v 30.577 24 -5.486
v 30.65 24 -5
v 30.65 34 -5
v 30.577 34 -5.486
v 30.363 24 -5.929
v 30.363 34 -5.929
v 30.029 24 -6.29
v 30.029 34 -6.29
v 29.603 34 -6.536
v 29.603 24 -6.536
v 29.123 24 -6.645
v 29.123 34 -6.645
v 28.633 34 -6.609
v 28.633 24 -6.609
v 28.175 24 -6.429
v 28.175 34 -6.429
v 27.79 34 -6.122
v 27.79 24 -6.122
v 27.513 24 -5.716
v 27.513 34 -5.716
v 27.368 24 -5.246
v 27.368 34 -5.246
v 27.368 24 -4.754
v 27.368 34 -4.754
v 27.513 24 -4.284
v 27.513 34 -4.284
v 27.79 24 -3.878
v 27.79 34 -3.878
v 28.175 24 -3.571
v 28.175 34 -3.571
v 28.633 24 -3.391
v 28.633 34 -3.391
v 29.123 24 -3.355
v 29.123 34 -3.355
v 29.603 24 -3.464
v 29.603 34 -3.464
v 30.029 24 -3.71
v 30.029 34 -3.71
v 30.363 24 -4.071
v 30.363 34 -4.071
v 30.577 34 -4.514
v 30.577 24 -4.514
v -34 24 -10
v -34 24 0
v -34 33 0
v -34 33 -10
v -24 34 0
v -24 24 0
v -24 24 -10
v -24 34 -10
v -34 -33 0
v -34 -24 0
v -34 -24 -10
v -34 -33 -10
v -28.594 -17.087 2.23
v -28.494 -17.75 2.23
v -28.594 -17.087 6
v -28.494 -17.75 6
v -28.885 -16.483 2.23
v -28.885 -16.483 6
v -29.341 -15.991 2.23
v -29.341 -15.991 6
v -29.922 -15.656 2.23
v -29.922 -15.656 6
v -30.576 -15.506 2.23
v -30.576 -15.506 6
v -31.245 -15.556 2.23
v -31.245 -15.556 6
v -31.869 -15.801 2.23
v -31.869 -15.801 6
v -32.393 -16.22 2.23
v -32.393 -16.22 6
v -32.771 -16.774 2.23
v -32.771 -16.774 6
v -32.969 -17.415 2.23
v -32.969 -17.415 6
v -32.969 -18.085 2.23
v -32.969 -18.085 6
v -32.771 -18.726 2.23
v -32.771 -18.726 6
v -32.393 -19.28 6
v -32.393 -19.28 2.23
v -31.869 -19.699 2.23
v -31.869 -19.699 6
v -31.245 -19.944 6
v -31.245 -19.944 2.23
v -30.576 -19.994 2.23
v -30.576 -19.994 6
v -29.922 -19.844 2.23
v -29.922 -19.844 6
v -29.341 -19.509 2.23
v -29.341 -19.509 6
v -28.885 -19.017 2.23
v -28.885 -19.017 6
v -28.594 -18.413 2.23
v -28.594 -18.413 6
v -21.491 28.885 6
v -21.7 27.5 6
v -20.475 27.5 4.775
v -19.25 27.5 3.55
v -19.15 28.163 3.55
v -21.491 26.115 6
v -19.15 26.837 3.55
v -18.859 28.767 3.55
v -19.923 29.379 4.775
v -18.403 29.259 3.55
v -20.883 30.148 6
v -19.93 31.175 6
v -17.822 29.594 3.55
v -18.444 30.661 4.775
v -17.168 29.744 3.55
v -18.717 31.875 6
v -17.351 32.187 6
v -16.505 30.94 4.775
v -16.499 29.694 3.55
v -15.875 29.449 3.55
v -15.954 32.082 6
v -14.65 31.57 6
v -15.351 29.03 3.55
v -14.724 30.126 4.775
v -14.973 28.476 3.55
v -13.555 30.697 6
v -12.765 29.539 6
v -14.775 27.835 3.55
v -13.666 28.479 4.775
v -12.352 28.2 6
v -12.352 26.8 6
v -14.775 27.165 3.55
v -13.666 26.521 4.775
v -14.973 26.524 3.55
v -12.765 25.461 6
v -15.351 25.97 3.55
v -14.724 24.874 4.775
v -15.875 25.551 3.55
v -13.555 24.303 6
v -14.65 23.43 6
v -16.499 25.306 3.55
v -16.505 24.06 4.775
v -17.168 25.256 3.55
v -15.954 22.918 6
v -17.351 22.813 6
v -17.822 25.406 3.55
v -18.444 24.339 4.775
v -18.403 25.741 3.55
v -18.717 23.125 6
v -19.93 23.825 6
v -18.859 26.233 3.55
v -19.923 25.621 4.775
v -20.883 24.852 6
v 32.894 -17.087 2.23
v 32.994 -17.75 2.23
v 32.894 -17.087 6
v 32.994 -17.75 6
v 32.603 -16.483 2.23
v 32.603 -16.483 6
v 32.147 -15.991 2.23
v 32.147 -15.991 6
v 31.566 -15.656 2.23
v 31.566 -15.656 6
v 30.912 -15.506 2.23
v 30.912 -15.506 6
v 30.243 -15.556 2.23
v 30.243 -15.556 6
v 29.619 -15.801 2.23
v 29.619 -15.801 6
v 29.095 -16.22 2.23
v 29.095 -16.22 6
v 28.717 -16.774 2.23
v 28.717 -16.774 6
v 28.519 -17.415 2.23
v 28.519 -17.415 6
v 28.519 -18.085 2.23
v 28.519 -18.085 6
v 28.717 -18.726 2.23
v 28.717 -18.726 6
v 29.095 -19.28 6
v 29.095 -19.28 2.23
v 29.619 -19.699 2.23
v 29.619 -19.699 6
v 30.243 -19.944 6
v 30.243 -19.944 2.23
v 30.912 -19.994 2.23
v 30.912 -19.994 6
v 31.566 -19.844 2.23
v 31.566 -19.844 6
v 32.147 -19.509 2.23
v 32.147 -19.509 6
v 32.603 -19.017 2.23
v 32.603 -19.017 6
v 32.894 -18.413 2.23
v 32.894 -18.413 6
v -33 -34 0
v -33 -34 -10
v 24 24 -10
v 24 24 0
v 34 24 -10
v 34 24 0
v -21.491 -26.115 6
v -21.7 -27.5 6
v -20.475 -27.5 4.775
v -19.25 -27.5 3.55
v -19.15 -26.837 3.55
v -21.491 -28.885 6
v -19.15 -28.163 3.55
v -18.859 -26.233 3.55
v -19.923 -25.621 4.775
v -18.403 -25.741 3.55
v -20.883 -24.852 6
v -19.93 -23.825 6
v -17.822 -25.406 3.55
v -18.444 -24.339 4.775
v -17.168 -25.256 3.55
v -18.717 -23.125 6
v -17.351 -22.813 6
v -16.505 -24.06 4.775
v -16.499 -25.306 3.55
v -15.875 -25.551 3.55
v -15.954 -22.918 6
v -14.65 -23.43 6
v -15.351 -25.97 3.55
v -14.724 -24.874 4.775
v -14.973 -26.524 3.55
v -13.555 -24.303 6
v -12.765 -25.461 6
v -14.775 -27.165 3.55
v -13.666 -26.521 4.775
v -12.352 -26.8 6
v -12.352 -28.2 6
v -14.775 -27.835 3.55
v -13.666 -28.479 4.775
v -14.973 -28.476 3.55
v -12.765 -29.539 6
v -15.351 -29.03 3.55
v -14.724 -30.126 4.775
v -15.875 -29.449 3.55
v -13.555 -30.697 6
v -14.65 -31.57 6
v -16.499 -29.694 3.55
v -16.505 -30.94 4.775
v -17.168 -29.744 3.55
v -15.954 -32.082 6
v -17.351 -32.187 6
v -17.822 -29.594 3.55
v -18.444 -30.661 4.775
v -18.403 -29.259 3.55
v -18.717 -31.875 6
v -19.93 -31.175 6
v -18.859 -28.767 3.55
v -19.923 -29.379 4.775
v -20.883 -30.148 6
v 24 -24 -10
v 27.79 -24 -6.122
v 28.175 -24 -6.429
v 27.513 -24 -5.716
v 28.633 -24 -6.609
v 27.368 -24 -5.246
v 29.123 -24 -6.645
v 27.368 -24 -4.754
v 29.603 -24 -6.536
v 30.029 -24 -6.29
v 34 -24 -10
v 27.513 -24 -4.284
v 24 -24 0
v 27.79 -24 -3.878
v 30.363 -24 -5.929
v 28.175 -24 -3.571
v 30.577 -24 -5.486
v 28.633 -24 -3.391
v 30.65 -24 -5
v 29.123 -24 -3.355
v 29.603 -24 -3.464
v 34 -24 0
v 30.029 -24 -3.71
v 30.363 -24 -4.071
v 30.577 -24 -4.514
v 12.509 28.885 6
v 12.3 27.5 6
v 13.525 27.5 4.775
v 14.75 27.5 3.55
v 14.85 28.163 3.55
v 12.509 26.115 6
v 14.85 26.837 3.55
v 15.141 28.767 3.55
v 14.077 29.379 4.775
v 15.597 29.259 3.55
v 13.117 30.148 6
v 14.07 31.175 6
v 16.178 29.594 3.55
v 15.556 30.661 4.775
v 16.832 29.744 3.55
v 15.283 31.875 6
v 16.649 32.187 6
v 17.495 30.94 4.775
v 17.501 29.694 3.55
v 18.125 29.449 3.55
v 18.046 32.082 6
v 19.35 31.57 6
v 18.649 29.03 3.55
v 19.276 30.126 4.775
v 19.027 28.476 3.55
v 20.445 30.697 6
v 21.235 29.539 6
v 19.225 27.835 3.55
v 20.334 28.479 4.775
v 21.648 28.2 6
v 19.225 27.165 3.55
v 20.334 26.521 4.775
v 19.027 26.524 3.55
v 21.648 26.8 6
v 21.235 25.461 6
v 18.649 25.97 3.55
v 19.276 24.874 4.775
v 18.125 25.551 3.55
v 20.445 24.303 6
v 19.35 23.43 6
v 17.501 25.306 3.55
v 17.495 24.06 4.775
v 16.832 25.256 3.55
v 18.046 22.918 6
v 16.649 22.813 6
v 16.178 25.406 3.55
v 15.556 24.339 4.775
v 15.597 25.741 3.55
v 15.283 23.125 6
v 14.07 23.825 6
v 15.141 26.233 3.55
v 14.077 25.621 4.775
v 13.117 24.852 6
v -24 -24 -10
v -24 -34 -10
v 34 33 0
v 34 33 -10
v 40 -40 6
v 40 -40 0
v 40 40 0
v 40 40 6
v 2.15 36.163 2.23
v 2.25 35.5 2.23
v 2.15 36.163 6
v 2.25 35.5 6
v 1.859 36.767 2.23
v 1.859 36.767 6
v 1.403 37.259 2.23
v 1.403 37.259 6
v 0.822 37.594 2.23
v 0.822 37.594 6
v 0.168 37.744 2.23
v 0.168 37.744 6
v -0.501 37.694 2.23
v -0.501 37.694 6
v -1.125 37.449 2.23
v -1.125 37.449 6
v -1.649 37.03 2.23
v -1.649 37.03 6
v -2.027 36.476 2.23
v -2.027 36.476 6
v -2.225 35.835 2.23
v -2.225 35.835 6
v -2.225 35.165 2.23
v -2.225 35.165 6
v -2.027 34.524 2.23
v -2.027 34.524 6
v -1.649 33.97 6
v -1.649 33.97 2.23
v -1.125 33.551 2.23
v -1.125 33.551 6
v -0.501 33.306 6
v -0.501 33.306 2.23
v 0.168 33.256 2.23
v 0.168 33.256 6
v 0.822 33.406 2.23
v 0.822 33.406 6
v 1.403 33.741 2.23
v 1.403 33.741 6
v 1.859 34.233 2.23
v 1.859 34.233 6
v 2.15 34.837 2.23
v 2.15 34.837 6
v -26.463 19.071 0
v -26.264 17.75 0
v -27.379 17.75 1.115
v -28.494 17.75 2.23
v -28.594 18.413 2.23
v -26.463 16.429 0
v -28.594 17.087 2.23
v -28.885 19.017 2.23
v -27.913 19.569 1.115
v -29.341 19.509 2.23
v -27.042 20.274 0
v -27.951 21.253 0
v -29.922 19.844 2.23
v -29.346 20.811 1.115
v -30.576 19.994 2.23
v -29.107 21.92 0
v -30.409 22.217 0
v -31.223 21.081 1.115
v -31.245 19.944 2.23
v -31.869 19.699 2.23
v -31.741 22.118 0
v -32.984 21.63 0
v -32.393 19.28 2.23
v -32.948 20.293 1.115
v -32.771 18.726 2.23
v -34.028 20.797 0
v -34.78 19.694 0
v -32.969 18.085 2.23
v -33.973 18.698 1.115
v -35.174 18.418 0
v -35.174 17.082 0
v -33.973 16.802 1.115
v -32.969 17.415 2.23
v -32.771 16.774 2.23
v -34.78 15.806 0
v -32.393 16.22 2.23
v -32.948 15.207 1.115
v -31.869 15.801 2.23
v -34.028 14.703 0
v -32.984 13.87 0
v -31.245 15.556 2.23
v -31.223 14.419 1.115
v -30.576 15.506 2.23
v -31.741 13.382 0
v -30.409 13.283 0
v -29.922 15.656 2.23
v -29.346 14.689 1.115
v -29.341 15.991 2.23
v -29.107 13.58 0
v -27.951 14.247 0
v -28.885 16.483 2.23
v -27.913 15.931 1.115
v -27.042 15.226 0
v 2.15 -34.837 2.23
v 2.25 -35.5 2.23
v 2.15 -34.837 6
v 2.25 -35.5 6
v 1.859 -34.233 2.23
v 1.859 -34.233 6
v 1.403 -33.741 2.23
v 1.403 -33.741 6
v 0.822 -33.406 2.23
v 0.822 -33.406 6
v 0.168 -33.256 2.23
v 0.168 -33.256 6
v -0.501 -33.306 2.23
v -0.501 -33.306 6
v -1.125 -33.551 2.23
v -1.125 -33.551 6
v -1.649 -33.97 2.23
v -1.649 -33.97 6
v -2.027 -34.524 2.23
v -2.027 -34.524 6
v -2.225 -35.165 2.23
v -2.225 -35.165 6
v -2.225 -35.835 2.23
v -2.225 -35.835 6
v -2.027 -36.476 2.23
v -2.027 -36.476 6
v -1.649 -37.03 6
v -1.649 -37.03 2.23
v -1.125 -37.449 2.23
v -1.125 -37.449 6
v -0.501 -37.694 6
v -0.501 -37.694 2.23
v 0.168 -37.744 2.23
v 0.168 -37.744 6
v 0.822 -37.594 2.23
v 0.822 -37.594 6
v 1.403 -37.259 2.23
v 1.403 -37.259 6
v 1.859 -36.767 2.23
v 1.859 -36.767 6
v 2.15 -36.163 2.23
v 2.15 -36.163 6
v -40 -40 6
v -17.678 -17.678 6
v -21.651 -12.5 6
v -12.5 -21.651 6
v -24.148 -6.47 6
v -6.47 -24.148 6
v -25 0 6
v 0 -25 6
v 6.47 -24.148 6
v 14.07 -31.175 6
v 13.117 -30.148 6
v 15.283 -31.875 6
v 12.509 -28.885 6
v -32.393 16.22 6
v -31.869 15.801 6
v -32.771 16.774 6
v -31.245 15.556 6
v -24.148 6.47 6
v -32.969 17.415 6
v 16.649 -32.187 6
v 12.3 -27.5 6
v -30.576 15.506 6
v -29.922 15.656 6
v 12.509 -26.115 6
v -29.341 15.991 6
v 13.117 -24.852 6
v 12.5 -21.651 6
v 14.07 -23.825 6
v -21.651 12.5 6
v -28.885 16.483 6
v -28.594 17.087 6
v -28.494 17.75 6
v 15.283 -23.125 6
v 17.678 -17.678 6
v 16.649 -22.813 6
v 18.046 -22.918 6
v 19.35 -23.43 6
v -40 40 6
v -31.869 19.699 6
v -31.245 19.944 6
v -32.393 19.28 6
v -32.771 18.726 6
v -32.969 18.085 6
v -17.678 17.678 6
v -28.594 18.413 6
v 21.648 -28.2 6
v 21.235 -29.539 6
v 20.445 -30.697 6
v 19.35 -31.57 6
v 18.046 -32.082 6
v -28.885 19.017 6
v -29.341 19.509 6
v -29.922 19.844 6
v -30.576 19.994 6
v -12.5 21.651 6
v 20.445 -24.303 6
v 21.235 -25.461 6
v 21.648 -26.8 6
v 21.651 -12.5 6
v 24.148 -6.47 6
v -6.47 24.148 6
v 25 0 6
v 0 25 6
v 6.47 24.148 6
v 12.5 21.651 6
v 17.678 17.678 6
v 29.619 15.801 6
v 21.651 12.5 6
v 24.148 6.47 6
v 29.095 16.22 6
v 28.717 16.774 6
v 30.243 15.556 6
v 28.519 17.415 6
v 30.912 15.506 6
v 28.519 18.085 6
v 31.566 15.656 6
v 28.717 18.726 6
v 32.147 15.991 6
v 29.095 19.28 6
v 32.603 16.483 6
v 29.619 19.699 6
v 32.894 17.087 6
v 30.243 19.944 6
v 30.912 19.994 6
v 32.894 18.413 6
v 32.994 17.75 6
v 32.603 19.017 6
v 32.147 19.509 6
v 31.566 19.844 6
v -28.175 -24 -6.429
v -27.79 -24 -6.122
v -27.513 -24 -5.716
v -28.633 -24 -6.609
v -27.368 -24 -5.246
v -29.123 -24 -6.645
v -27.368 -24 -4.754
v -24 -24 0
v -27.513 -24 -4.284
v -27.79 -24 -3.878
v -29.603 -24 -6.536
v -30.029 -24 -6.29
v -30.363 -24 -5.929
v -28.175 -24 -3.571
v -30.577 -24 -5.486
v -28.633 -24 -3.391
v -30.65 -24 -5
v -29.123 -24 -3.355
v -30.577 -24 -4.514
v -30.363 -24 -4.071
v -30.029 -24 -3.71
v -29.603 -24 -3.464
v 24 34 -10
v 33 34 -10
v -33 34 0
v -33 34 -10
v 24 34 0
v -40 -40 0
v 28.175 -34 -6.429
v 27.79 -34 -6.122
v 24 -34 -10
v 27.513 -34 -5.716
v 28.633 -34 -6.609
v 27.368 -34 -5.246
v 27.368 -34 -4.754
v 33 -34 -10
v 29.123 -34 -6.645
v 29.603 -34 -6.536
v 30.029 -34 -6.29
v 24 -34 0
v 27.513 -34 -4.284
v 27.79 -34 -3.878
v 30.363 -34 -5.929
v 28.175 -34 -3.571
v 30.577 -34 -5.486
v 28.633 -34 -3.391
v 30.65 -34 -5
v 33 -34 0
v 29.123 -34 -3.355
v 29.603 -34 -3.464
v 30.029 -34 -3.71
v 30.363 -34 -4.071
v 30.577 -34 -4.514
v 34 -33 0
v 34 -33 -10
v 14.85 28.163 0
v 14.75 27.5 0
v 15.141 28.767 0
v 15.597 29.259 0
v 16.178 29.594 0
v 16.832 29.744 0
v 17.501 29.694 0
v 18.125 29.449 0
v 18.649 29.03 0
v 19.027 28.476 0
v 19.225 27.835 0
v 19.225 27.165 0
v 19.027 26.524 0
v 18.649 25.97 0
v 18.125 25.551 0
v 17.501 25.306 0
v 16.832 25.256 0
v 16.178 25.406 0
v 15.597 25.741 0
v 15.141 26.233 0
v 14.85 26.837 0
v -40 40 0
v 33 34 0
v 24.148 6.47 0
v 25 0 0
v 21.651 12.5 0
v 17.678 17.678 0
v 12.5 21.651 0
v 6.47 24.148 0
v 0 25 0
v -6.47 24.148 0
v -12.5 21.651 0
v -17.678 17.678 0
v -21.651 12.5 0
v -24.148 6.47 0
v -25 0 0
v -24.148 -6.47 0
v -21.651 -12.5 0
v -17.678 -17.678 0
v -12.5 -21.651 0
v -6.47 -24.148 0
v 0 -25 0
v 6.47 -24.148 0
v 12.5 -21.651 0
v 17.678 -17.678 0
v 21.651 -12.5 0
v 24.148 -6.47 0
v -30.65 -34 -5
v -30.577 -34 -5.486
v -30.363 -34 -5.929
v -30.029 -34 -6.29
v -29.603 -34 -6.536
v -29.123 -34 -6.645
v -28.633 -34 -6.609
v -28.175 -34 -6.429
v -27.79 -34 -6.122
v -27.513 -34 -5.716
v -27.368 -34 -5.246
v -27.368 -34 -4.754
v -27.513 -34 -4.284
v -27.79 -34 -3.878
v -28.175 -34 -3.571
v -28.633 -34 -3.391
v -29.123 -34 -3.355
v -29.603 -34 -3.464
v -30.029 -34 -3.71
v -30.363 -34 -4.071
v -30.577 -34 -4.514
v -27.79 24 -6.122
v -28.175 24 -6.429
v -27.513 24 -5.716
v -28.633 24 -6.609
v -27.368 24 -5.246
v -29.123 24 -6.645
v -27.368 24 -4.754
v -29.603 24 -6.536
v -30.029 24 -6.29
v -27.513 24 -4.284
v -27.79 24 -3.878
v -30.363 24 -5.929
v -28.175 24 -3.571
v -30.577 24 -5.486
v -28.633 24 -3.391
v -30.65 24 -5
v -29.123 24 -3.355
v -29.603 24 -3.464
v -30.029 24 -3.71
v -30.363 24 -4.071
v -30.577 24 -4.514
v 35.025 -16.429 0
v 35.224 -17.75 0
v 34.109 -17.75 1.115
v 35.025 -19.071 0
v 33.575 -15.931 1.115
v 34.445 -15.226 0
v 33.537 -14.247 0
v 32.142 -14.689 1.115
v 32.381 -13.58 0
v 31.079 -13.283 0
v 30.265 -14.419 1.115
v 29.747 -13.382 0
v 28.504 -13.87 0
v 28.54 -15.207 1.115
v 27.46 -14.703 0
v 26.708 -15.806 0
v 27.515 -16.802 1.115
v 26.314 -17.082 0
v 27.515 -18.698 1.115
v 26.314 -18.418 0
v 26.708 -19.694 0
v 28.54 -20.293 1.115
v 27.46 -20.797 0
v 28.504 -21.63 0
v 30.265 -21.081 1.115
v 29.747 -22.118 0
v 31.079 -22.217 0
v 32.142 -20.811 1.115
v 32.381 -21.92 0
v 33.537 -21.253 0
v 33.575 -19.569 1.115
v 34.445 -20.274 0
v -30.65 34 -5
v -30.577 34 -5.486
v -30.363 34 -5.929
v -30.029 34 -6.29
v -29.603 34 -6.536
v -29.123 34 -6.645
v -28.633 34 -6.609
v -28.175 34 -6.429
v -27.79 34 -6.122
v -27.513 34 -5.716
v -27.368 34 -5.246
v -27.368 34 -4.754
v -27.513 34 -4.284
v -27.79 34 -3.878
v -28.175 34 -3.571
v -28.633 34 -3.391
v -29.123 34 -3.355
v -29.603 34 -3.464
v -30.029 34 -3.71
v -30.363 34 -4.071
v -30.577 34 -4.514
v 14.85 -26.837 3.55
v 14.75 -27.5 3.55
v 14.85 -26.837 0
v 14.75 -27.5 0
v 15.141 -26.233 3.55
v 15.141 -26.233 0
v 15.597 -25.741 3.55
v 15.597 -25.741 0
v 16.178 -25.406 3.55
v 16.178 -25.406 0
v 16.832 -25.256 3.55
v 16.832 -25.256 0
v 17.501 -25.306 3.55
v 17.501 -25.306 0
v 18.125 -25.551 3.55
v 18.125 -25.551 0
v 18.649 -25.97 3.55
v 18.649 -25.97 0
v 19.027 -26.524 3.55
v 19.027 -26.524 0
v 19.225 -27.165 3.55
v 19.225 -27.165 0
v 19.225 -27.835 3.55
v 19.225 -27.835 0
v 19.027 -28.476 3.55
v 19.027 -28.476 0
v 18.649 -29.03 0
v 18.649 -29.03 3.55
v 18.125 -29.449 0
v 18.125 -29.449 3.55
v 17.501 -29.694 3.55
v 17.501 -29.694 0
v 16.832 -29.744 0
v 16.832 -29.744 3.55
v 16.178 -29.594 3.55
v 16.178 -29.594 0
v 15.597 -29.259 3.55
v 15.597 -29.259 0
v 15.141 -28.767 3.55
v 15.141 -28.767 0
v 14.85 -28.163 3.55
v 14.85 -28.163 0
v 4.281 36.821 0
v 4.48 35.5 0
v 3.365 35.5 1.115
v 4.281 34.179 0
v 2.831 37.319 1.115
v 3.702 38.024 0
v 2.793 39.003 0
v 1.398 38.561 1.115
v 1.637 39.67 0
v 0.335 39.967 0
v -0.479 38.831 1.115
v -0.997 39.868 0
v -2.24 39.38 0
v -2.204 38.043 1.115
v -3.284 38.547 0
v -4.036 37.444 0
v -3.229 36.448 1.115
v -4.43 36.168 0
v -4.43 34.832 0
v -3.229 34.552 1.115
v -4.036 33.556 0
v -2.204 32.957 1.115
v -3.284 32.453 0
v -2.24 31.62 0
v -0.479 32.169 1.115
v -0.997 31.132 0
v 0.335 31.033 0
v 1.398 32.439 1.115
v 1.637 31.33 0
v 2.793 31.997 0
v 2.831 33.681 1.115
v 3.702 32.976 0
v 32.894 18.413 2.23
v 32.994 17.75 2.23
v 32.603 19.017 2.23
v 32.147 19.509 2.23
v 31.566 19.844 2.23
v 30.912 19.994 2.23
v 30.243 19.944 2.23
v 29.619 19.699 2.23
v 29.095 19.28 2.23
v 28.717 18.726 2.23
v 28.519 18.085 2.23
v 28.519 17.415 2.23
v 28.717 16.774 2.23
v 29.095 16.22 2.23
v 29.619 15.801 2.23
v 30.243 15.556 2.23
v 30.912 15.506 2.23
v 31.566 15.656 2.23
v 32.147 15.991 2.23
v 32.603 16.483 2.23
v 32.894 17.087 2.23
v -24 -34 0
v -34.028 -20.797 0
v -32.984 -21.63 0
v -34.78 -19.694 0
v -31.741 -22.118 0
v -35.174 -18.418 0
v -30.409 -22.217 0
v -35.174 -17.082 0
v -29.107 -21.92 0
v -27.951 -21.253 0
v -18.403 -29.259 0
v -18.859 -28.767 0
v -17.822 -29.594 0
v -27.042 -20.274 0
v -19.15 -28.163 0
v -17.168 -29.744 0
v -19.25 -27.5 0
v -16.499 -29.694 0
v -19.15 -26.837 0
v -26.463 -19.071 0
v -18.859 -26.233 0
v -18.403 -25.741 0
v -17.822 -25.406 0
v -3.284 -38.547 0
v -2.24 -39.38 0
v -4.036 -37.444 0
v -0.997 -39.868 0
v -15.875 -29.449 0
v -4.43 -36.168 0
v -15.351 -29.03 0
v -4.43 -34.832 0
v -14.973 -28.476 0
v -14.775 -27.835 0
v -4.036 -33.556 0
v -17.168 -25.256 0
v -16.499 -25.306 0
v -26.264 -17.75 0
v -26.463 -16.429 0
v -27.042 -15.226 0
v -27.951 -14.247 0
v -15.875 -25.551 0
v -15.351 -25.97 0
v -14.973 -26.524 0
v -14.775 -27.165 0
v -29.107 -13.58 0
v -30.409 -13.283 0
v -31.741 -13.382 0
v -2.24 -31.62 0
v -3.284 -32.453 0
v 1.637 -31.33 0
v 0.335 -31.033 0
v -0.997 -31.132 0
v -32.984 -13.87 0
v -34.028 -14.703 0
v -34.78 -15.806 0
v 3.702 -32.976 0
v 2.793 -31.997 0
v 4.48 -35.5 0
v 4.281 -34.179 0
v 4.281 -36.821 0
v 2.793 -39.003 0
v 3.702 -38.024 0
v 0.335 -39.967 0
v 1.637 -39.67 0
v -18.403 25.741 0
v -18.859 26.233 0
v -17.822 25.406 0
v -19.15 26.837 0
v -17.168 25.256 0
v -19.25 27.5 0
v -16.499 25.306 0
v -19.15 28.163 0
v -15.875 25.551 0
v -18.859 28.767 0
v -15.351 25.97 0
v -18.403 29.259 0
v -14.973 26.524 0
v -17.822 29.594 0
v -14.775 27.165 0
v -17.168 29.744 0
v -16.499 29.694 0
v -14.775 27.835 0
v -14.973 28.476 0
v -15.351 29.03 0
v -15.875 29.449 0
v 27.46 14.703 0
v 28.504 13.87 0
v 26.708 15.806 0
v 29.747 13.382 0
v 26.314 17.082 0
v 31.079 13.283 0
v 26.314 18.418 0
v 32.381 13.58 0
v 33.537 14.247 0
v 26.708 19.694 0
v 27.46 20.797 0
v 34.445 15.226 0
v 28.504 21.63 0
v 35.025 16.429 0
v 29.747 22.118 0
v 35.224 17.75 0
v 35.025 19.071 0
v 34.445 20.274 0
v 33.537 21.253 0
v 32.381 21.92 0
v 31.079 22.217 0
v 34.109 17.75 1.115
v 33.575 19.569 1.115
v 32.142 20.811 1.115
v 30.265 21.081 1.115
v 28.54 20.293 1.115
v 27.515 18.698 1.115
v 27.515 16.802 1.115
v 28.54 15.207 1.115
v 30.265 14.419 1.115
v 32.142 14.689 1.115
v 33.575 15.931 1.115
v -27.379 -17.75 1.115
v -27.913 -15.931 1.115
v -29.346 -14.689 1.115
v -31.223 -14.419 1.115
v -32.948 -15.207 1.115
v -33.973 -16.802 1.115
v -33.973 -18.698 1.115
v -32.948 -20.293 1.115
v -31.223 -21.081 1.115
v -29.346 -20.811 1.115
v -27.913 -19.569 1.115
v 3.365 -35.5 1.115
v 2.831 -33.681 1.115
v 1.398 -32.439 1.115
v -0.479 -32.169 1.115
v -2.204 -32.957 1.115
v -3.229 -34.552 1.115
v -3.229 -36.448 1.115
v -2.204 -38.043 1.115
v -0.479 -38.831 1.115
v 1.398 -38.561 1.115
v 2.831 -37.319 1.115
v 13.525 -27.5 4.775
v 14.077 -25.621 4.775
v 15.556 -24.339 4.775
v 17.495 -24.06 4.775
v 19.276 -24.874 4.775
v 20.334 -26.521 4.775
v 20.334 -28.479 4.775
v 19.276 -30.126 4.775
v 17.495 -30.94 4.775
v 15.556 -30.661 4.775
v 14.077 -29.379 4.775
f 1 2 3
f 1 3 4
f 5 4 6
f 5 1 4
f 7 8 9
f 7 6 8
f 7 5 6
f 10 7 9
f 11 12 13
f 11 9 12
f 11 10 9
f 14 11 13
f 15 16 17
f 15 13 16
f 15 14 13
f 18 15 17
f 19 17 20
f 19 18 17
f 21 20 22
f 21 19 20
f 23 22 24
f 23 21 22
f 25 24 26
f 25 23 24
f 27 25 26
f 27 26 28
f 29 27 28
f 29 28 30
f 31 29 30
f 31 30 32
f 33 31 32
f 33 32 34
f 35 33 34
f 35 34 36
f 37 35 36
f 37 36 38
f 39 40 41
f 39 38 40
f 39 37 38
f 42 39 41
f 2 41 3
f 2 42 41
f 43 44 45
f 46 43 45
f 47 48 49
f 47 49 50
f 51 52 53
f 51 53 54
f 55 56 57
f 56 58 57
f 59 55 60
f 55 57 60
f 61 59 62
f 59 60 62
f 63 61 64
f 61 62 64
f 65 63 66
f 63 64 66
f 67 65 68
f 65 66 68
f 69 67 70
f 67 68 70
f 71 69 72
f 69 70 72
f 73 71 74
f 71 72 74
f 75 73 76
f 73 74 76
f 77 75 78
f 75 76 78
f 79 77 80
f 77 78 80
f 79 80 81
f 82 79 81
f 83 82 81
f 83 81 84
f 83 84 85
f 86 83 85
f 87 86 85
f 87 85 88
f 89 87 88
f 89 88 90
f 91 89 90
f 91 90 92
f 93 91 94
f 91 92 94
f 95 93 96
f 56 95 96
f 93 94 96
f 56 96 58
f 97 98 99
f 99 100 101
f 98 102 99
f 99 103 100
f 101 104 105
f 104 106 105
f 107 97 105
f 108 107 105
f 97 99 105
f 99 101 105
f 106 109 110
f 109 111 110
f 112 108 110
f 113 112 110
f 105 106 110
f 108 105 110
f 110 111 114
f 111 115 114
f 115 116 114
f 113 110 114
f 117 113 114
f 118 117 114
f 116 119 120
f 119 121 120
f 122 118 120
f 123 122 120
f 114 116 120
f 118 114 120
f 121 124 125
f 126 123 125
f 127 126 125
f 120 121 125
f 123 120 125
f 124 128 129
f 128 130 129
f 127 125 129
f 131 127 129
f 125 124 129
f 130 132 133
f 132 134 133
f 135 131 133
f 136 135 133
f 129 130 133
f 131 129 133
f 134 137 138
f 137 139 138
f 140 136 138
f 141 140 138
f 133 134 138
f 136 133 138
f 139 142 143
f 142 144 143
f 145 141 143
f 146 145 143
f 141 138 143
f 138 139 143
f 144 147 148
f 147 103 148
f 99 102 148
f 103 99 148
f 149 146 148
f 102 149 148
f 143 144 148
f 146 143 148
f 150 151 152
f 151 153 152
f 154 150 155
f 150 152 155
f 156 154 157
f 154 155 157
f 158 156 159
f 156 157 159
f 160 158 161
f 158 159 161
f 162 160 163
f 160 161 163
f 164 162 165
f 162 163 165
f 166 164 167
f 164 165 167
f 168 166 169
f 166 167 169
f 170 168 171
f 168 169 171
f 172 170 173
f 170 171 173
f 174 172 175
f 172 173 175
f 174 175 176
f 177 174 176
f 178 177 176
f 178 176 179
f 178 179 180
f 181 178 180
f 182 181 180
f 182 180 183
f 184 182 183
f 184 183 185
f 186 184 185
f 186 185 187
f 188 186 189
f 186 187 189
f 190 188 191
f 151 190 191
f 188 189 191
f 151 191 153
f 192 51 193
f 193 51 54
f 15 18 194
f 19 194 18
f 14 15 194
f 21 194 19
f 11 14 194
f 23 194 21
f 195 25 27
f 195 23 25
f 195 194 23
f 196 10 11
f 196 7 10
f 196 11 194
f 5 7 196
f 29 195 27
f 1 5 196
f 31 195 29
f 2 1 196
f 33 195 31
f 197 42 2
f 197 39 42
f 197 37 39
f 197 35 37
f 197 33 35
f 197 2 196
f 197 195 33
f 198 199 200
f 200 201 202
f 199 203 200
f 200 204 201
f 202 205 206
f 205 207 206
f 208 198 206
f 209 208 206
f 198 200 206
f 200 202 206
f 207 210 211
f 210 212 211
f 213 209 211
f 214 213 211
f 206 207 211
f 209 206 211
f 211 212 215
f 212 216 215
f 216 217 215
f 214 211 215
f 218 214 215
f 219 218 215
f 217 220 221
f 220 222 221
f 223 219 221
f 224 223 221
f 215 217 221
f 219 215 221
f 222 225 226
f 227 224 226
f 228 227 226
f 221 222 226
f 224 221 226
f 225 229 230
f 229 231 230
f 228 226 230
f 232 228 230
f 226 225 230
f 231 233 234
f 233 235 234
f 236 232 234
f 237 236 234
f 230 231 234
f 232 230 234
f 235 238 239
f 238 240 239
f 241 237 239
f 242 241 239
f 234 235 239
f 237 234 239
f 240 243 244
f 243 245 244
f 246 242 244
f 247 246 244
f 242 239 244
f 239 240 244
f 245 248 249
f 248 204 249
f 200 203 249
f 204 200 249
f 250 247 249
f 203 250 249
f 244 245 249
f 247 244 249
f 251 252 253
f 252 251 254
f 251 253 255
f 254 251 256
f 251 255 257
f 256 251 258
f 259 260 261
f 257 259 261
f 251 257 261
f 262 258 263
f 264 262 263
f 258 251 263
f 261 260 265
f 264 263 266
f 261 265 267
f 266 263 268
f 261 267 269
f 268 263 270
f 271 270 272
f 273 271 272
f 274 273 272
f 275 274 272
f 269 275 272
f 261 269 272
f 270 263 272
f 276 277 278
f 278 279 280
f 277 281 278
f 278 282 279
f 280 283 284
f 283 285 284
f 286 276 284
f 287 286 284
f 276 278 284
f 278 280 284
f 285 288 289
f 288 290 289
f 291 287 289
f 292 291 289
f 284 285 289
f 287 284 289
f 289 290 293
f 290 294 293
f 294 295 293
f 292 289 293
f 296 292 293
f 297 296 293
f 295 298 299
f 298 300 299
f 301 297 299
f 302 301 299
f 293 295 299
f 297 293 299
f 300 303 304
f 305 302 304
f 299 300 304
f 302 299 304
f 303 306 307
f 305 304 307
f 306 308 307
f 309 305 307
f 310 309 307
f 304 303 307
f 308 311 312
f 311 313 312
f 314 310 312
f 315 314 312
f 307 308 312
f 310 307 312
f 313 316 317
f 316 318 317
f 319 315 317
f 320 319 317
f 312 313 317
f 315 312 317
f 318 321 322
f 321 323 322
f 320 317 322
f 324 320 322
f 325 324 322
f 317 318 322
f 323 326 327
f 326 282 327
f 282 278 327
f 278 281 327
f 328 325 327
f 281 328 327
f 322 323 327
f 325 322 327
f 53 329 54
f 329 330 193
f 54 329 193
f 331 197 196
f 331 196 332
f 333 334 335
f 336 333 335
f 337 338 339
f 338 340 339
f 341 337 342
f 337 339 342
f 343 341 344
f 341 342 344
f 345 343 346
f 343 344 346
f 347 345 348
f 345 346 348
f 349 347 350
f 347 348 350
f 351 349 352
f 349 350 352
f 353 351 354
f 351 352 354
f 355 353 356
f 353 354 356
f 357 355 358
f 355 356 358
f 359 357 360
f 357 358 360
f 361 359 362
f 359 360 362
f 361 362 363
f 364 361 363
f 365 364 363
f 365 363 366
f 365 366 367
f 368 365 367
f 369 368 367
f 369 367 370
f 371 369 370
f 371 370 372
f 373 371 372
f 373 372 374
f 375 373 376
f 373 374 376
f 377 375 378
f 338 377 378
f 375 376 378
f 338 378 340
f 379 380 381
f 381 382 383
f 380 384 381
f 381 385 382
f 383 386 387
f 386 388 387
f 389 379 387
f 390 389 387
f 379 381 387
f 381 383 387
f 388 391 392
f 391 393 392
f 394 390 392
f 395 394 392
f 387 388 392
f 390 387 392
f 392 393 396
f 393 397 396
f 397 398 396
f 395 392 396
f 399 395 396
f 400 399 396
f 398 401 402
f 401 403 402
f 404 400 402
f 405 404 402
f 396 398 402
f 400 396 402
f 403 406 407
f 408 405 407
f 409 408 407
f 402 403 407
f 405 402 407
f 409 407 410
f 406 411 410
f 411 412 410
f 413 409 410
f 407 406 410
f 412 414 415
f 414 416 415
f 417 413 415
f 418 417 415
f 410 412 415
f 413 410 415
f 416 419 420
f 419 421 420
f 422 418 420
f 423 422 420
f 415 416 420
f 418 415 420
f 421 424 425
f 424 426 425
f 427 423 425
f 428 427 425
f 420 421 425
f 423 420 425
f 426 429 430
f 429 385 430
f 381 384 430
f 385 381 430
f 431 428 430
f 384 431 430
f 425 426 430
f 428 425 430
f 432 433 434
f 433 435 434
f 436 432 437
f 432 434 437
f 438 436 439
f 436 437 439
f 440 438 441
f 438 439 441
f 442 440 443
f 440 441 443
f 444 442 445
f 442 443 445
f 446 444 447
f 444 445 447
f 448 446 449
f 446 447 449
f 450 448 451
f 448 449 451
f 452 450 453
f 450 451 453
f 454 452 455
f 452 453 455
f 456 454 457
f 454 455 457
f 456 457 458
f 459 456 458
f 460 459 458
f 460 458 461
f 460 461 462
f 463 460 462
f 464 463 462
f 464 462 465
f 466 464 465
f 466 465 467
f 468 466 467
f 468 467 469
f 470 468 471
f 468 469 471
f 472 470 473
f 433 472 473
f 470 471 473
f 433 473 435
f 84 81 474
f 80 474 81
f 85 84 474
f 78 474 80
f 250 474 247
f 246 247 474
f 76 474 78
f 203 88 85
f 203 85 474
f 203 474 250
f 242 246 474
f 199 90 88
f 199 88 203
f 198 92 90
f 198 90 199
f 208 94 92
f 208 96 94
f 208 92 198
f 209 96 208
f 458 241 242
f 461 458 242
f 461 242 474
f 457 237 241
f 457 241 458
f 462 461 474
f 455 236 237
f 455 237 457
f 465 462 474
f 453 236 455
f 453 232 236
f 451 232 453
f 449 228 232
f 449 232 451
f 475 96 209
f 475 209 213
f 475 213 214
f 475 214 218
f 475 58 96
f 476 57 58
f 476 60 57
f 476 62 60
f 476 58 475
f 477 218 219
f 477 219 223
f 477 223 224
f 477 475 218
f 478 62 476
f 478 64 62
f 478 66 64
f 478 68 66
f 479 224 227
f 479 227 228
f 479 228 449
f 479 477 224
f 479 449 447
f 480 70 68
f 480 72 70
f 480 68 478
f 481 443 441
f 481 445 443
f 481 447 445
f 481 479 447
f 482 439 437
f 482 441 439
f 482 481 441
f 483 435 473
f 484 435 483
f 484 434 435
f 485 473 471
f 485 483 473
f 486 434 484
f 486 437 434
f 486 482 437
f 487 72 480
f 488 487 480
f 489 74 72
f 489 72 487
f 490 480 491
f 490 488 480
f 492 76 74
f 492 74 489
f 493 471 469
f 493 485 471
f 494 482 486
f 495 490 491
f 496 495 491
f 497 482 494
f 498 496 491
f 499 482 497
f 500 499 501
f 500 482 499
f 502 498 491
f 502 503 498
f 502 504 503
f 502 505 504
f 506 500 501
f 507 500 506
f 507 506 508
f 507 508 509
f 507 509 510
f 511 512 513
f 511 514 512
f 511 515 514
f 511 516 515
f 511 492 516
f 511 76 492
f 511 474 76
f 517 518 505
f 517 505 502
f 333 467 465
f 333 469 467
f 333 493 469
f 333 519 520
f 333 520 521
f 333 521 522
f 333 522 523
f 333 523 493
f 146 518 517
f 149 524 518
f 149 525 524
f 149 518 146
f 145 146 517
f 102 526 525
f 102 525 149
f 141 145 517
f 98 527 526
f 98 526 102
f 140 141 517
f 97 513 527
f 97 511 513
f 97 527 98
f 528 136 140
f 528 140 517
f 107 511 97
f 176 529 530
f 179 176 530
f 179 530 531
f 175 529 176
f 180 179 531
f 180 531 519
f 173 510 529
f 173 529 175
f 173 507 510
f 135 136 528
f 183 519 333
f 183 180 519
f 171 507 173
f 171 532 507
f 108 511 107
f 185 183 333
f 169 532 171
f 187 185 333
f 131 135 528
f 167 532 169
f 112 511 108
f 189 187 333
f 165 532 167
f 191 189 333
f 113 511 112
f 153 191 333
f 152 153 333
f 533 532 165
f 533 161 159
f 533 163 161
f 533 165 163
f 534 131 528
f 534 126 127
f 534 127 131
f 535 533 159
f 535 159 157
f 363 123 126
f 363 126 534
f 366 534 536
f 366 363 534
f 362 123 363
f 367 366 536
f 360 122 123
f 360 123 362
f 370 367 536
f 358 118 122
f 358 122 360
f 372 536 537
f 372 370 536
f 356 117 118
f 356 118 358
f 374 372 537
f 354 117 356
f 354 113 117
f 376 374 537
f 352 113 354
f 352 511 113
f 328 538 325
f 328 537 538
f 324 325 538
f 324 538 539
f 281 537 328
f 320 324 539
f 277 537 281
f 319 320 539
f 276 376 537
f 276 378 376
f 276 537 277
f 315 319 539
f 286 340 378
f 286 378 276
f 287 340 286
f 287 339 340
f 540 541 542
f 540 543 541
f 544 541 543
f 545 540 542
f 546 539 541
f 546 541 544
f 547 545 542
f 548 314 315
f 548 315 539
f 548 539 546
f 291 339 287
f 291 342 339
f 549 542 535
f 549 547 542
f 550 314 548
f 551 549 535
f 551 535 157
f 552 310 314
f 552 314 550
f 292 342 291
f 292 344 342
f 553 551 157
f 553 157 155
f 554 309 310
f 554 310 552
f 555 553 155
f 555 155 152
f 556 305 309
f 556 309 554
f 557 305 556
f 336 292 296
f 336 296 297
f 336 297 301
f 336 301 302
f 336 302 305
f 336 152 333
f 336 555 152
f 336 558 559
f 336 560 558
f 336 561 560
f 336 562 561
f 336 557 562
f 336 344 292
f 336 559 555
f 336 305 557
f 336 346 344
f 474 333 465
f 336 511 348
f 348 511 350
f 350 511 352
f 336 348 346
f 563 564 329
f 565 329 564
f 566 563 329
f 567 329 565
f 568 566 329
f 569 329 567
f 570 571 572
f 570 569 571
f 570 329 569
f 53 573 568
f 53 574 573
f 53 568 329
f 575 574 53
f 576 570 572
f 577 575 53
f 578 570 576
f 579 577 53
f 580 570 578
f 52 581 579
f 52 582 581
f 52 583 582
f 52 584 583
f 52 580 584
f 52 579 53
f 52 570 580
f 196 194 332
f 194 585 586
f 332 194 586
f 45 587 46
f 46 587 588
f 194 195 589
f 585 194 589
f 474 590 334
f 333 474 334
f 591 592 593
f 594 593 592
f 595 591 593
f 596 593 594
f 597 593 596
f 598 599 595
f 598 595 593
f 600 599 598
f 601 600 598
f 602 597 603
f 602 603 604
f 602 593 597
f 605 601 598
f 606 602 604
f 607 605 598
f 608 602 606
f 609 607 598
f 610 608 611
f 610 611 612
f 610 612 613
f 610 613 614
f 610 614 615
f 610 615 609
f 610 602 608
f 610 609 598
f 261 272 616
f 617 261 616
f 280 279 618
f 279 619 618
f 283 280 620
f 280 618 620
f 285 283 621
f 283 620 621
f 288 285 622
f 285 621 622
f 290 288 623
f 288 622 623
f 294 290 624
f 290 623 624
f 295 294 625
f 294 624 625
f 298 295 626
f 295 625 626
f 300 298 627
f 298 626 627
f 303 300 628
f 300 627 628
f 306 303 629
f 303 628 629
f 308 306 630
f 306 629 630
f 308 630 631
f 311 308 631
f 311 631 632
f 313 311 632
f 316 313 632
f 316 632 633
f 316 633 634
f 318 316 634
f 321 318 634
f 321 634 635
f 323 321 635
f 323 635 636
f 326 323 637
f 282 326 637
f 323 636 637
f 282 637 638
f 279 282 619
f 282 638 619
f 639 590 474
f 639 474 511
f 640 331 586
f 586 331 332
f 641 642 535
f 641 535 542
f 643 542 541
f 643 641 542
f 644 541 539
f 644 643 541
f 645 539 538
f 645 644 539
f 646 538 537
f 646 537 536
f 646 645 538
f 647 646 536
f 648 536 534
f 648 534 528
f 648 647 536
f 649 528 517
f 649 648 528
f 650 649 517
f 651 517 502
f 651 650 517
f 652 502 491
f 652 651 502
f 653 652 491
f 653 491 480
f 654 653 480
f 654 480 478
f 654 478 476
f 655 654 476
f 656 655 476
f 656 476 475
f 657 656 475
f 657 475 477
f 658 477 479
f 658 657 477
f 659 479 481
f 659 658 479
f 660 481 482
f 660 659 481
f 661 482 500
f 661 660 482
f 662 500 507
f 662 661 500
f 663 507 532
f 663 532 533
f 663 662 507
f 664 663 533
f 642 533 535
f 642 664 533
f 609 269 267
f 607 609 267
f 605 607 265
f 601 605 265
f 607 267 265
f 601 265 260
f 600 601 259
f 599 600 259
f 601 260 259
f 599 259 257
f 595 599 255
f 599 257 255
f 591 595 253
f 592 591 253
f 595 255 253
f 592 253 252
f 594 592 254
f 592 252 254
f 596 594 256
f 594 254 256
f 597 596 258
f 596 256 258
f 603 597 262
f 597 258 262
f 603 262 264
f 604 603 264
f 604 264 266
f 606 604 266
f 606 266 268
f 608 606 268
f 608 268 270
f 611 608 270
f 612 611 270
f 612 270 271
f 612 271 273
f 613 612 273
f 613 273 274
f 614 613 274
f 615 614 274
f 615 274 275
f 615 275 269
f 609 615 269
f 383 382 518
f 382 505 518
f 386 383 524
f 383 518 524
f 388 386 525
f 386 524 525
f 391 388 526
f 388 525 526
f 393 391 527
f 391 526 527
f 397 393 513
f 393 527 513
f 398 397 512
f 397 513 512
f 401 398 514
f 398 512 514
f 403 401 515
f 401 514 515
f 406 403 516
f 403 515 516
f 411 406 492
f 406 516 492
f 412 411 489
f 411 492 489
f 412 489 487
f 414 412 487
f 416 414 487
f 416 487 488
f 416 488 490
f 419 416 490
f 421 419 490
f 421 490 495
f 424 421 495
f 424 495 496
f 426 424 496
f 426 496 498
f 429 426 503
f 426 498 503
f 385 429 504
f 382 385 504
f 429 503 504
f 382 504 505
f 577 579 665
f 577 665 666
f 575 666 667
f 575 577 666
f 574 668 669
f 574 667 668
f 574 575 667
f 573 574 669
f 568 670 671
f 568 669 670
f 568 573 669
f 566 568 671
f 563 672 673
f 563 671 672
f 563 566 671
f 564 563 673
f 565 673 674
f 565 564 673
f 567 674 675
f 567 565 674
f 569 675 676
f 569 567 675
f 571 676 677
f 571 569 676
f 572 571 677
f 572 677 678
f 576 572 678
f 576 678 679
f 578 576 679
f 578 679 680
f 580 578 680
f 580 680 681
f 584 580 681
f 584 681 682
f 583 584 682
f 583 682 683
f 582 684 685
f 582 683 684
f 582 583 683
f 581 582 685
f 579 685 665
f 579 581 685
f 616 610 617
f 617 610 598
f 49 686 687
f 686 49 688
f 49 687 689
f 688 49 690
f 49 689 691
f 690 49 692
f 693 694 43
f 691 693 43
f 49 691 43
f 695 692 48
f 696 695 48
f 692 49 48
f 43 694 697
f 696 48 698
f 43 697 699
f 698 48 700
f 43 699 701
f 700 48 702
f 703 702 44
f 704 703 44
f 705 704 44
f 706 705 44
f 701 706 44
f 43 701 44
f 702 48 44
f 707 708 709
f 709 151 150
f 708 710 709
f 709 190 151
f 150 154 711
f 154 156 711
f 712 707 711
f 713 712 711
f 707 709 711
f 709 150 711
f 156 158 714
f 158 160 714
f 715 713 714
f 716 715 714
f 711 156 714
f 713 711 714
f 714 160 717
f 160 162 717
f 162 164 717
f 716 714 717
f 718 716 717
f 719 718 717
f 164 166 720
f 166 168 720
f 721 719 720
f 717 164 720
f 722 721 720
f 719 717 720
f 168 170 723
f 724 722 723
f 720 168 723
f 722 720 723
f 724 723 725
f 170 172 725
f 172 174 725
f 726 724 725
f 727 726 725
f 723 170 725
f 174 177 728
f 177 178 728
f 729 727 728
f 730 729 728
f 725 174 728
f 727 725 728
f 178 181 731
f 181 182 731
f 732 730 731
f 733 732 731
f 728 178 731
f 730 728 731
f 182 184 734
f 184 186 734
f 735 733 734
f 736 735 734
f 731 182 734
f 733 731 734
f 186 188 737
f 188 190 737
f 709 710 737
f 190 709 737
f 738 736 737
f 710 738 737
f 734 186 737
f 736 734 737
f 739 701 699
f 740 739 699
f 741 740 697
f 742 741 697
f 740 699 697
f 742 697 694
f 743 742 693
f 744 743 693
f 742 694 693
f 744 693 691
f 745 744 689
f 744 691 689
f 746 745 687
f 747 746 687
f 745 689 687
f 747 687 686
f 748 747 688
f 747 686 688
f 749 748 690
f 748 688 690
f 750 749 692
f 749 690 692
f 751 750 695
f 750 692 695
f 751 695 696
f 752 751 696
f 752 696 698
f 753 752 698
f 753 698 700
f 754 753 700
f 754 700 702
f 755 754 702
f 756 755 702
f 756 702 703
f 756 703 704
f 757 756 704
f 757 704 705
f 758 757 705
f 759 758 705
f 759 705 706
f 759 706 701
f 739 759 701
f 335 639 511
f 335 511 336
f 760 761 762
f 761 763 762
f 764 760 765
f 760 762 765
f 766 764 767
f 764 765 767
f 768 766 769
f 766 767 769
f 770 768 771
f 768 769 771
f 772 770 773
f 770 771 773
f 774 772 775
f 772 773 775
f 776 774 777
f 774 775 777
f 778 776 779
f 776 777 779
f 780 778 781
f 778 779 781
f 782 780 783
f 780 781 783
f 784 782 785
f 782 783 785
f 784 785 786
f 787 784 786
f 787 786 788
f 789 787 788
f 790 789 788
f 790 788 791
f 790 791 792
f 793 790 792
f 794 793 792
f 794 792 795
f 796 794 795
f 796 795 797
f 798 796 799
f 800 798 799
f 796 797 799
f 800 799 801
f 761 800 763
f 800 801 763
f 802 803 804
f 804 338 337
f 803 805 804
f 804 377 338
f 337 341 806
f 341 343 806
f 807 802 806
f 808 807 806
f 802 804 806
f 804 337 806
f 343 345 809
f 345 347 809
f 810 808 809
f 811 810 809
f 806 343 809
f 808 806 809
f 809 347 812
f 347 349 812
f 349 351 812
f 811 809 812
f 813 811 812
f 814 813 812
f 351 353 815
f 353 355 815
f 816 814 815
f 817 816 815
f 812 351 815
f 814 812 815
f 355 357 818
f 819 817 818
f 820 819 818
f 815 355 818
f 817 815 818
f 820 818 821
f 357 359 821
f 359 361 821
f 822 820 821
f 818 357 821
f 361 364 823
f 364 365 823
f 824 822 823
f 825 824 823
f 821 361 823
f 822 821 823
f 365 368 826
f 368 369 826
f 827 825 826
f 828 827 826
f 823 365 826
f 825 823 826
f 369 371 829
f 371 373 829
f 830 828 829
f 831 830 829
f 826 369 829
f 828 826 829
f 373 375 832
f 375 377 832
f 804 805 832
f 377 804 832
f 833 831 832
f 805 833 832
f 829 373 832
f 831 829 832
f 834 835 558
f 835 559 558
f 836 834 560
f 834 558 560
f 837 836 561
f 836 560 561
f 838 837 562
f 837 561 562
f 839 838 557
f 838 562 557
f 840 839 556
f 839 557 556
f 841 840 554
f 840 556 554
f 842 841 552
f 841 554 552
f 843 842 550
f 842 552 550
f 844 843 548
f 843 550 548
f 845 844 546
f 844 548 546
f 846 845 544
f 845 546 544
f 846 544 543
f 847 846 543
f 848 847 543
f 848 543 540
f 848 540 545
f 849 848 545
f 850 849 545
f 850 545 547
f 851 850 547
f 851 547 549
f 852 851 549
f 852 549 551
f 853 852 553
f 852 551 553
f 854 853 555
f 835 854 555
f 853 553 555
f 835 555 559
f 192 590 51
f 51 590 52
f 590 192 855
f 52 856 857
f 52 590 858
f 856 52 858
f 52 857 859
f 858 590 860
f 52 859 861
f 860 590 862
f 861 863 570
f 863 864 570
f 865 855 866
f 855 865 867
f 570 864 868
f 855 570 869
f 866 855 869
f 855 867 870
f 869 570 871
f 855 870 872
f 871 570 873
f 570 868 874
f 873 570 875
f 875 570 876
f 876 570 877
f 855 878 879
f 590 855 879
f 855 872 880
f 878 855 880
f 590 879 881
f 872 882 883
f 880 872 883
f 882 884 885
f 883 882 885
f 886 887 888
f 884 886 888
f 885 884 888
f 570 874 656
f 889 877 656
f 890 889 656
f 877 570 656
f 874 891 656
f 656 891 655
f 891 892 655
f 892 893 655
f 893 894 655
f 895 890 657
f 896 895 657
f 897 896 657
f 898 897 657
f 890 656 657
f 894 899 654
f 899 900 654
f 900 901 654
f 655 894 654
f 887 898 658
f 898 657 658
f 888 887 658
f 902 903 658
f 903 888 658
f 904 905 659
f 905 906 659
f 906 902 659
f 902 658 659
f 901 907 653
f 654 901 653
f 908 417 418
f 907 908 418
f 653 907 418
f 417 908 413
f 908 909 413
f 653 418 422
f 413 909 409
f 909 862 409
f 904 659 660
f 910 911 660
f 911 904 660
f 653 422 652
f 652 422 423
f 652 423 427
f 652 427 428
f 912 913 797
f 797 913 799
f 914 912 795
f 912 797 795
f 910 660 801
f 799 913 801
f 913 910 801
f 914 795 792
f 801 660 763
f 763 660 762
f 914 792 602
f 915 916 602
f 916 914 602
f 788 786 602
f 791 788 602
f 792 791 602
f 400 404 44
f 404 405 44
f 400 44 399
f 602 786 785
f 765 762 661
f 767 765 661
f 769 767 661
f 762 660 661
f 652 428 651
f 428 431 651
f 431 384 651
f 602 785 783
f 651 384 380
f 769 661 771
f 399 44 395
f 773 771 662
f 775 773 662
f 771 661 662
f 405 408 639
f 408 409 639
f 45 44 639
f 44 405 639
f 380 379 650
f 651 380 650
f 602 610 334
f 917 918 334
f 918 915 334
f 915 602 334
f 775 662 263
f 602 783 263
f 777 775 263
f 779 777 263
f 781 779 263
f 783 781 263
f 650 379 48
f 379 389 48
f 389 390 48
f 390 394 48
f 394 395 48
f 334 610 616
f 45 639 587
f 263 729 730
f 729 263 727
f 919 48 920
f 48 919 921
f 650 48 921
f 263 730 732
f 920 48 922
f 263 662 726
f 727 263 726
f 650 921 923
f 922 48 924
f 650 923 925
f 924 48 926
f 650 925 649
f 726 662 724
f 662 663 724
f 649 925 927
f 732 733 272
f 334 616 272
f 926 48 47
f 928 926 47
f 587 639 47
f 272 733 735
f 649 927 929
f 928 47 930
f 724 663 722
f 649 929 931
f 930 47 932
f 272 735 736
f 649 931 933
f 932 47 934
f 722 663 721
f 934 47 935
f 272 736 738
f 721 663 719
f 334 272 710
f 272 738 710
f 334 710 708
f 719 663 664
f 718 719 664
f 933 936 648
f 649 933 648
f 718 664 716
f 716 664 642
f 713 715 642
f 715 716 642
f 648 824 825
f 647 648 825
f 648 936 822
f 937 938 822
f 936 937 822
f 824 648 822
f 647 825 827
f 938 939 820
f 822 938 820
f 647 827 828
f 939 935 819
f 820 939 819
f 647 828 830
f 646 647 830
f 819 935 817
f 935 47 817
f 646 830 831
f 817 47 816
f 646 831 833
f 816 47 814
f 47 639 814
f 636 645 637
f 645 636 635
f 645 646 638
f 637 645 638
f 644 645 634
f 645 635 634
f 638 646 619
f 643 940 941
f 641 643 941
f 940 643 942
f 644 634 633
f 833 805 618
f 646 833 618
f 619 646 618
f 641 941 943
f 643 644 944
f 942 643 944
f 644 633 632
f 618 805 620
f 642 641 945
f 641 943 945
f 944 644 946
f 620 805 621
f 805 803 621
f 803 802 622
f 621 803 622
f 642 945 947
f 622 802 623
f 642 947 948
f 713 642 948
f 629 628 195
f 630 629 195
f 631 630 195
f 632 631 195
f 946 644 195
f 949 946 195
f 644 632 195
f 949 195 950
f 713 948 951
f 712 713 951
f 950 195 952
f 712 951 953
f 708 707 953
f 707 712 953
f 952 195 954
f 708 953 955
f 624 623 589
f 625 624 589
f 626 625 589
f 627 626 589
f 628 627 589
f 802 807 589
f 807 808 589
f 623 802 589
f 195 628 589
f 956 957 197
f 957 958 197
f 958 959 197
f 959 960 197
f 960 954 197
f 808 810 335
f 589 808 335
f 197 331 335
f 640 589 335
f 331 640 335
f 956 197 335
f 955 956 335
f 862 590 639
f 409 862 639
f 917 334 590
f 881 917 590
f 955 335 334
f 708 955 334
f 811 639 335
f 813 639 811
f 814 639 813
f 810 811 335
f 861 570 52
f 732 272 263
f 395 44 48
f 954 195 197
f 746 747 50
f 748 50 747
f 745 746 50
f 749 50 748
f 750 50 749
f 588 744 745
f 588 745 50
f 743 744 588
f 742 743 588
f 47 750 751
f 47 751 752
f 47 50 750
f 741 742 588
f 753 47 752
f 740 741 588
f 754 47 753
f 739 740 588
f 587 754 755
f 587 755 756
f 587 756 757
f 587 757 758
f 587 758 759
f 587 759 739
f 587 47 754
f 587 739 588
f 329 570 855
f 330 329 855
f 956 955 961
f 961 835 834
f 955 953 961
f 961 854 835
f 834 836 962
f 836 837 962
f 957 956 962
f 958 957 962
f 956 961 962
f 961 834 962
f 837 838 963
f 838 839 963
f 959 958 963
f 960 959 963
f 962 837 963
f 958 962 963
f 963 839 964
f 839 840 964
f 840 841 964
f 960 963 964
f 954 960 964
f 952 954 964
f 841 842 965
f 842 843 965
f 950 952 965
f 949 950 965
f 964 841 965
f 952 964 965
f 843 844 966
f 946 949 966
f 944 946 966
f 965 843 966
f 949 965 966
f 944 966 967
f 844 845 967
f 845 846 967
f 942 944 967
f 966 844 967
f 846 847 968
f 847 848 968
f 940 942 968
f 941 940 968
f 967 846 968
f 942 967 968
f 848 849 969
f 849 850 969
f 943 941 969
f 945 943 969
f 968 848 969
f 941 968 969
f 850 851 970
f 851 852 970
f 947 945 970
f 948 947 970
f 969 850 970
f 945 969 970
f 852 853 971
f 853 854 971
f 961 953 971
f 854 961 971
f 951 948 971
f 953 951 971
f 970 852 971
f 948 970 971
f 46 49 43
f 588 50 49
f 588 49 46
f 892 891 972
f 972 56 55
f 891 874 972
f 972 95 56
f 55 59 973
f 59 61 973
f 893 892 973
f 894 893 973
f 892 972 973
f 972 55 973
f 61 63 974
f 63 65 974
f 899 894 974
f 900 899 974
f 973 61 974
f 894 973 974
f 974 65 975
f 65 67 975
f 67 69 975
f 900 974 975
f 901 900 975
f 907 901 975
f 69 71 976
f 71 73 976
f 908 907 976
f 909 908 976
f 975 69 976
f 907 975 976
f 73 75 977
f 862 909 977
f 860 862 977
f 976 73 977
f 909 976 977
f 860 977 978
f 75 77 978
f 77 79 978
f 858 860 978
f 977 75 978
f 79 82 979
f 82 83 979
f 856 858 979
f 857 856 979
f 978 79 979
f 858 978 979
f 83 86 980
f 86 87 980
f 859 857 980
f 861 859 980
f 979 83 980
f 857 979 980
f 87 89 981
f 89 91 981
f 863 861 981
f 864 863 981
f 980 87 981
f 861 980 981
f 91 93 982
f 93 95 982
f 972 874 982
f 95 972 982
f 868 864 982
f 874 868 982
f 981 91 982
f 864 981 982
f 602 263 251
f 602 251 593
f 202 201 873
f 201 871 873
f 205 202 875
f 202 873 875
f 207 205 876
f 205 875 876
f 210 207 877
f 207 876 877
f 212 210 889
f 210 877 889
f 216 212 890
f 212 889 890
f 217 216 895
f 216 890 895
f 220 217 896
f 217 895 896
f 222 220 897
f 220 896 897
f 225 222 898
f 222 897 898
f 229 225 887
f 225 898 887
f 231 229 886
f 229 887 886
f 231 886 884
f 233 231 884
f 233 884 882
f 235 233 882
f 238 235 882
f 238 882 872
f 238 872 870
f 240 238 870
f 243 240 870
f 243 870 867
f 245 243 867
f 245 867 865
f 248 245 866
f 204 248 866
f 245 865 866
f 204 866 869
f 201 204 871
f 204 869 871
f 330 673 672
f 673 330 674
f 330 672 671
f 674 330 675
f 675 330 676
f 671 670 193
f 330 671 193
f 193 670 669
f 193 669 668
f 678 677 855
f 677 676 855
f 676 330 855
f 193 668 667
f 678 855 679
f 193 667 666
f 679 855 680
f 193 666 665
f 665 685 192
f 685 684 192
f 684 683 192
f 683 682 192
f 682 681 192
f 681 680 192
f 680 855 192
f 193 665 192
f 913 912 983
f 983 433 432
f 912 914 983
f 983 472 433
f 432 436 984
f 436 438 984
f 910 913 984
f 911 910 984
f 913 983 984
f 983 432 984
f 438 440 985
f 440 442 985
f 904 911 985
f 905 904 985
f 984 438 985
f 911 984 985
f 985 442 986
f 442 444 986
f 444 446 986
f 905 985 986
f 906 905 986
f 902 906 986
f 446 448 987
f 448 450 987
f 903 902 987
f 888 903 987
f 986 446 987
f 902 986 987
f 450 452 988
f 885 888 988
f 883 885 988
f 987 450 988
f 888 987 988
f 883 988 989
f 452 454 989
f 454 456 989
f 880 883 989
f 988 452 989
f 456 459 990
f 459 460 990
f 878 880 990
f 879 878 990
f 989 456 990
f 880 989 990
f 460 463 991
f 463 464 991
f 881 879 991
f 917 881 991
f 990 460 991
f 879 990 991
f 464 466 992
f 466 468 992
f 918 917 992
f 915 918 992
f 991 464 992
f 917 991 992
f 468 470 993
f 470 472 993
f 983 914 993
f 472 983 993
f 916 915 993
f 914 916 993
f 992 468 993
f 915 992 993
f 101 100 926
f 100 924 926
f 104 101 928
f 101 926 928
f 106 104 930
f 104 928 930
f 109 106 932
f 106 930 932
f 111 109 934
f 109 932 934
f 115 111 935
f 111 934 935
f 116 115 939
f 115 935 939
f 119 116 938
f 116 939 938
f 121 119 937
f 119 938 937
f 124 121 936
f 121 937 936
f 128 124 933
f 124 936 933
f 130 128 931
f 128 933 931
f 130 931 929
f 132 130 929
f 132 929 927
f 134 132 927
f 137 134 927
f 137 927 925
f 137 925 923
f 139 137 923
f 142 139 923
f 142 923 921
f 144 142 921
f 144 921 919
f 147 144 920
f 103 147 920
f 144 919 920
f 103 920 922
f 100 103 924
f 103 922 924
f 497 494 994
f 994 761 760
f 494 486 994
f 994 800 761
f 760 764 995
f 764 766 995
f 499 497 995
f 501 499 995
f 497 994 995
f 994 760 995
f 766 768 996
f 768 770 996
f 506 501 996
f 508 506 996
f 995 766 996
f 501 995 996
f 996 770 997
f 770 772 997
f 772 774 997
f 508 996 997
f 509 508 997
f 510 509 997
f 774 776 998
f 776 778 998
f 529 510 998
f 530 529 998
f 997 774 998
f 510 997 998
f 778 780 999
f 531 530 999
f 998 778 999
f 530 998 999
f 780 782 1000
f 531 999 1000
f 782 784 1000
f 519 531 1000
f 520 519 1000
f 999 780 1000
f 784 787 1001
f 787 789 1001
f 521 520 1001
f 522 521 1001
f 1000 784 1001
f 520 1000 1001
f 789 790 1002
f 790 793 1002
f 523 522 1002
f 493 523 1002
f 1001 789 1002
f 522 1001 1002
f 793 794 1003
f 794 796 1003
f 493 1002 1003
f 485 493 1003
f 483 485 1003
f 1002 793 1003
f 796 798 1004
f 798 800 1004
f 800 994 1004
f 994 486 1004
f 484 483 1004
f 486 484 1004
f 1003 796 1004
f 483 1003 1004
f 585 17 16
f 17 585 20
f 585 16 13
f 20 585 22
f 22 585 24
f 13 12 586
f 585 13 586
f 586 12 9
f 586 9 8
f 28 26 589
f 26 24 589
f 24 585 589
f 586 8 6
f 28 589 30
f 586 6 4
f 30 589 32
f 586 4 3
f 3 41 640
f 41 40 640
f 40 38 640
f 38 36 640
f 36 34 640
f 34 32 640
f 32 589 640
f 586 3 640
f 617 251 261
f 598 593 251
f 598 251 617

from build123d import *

# Parameters (mm, degrees)
SKETCH_1_W                     = 80
SKETCH_1_H                     = 80
SKETCH_1_R                     = 25
EXTRUDE_1_DEPTH                = 6
SKETCH_11_W                    = 10
SKETCH_11_H                    = 10
EXTRUDE_3_DEPTH                = 10
HOLE_WIZARD_M4_1_D             = 4.5
HOLE_WIZARD_M4_1_CSINK_D       = 8.96
HOLE_WIZARD_M4_1_CSINK_ANGLE   = 90
HOLE_WIZARD_M4_2_D             = 3.3
HOLE_WIZARD_M4_2_DEPTH         = 68
MIRROR_2_COPY_1_SKETCH_W       = 10
MIRROR_2_COPY_1_SKETCH_H       = 10
MIRROR_2_COPY_1_DEPTH          = 10
MIRROR_2_COPY_2_D              = 3.3
MIRROR_2_COPY_2_DEPTH          = 68
HOLE_WIZARD_M4_1_2_D           = 4.5
HOLE_WIZARD_M4_1_2_CSINK_D     = 9.4
HOLE_WIZARD_M4_1_2_CSINK_ANGLE = 90
CHAMFER_1_SIZE                 = 1


with BuildPart() as part:
    # 스케치1 → 보스-돌출1 (new body)
    with BuildSketch(Plane.XY):
        Rectangle(SKETCH_1_W, SKETCH_1_H)
        Circle(SKETCH_1_R, mode=Mode.SUBTRACT)
    extrude(amount=EXTRUDE_1_DEPTH)

    # 스케치11 → 보스-돌출3 (add)
    with BuildSketch(Plane(origin=(0, 0, 0), x_dir=(-1, 0, 0), z_dir=(0, 0, -1))):
        with Locations((29, 29)):
            Rectangle(SKETCH_11_W, SKETCH_11_H)
    extrude_3 = extrude(amount=EXTRUDE_3_DEPTH)

    # Hole Wizard M4 _ _ _ _ _ _ _1 (through all)
    with Locations(Plane(origin=(0, 0, 0), x_dir=(-1, 0, 0), z_dir=(0, 0, -1))):
        with Locations((0, -35.5), (30.743901834, -17.75), (30.743901834, 17.75), (0, 35.5), (-30.743901834, 17.75), (-30.743901834, -17.75)):
            CounterSinkHole(HOLE_WIZARD_M4_1_D / 2, HOLE_WIZARD_M4_1_CSINK_D / 2, counter_sink_angle=HOLE_WIZARD_M4_1_CSINK_ANGLE)

    # M4 나사 구멍2
    with Locations(Plane(origin=(0, 34, 0), x_dir=(1, 0, 0), z_dir=(0, 1, 0))):
        with Locations((-29, 5)):
            hole_wizard_m4_2 = Hole(HOLE_WIZARD_M4_2_D / 2, depth=HOLE_WIZARD_M4_2_DEPTH)

    # 대칭 복사1: 보스-돌출3, M4 나사 구멍2 across plane
    add(extrude_3.mirror(Plane(origin=(0, 0, 0), x_dir=(0, 0, 1), z_dir=(1, 0, 0))))
    add(hole_wizard_m4_2.mirror(Plane(origin=(0, 0, 0), x_dir=(0, 0, 1), z_dir=(1, 0, 0))), mode=Mode.SUBTRACT)

    # 대칭 복사2: 보스-돌출3, M4 나사 구멍2 across plane
    add(extrude_3.mirror(Plane.ZX))
    add(hole_wizard_m4_2.mirror(Plane.ZX), mode=Mode.SUBTRACT)

    # 대칭 복사2 copy 1 sketch → 대칭 복사2 copy 1 (add)
    with BuildSketch(Plane(origin=(0, 0, 0), x_dir=(1, 0, 0), z_dir=(0, 0, -1))):
        with Locations((29, 29)):
            Rectangle(MIRROR_2_COPY_1_SKETCH_W, MIRROR_2_COPY_1_SKETCH_H)
    extrude(amount=MIRROR_2_COPY_1_DEPTH)

    # 대칭 복사2 copy 2
    with Locations(Plane(origin=(0, -34, 0), x_dir=(-1, 0, 0), z_dir=(0, -1, 0))):
        with Locations((-29, 5)):
            Hole(MIRROR_2_COPY_2_D / 2, depth=MIRROR_2_COPY_2_DEPTH)

    # Hole Wizard M4 _ _ _ _1 2 (through all)
    with Locations(Plane.XY.offset(6)):
        with Locations((17, 27.5), (17, -27.5), (-17, 27.5), (-17, -27.5)):
            CounterSinkHole(HOLE_WIZARD_M4_1_2_D / 2, HOLE_WIZARD_M4_1_2_CSINK_D / 2, counter_sink_angle=HOLE_WIZARD_M4_1_2_CSINK_ANGLE)

    # 모따기1
    chamfer_1_edges = [part.edges().sort_by_distance(p)[0] for p in [
        (-34, -34, -5),
        (-34, 34, -5),
        (34, 34, -5),
        (34, -34, -5),
    ]]
    chamfer(chamfer_1_edges, length=CHAMFER_1_SIZE)


solid = part.part
